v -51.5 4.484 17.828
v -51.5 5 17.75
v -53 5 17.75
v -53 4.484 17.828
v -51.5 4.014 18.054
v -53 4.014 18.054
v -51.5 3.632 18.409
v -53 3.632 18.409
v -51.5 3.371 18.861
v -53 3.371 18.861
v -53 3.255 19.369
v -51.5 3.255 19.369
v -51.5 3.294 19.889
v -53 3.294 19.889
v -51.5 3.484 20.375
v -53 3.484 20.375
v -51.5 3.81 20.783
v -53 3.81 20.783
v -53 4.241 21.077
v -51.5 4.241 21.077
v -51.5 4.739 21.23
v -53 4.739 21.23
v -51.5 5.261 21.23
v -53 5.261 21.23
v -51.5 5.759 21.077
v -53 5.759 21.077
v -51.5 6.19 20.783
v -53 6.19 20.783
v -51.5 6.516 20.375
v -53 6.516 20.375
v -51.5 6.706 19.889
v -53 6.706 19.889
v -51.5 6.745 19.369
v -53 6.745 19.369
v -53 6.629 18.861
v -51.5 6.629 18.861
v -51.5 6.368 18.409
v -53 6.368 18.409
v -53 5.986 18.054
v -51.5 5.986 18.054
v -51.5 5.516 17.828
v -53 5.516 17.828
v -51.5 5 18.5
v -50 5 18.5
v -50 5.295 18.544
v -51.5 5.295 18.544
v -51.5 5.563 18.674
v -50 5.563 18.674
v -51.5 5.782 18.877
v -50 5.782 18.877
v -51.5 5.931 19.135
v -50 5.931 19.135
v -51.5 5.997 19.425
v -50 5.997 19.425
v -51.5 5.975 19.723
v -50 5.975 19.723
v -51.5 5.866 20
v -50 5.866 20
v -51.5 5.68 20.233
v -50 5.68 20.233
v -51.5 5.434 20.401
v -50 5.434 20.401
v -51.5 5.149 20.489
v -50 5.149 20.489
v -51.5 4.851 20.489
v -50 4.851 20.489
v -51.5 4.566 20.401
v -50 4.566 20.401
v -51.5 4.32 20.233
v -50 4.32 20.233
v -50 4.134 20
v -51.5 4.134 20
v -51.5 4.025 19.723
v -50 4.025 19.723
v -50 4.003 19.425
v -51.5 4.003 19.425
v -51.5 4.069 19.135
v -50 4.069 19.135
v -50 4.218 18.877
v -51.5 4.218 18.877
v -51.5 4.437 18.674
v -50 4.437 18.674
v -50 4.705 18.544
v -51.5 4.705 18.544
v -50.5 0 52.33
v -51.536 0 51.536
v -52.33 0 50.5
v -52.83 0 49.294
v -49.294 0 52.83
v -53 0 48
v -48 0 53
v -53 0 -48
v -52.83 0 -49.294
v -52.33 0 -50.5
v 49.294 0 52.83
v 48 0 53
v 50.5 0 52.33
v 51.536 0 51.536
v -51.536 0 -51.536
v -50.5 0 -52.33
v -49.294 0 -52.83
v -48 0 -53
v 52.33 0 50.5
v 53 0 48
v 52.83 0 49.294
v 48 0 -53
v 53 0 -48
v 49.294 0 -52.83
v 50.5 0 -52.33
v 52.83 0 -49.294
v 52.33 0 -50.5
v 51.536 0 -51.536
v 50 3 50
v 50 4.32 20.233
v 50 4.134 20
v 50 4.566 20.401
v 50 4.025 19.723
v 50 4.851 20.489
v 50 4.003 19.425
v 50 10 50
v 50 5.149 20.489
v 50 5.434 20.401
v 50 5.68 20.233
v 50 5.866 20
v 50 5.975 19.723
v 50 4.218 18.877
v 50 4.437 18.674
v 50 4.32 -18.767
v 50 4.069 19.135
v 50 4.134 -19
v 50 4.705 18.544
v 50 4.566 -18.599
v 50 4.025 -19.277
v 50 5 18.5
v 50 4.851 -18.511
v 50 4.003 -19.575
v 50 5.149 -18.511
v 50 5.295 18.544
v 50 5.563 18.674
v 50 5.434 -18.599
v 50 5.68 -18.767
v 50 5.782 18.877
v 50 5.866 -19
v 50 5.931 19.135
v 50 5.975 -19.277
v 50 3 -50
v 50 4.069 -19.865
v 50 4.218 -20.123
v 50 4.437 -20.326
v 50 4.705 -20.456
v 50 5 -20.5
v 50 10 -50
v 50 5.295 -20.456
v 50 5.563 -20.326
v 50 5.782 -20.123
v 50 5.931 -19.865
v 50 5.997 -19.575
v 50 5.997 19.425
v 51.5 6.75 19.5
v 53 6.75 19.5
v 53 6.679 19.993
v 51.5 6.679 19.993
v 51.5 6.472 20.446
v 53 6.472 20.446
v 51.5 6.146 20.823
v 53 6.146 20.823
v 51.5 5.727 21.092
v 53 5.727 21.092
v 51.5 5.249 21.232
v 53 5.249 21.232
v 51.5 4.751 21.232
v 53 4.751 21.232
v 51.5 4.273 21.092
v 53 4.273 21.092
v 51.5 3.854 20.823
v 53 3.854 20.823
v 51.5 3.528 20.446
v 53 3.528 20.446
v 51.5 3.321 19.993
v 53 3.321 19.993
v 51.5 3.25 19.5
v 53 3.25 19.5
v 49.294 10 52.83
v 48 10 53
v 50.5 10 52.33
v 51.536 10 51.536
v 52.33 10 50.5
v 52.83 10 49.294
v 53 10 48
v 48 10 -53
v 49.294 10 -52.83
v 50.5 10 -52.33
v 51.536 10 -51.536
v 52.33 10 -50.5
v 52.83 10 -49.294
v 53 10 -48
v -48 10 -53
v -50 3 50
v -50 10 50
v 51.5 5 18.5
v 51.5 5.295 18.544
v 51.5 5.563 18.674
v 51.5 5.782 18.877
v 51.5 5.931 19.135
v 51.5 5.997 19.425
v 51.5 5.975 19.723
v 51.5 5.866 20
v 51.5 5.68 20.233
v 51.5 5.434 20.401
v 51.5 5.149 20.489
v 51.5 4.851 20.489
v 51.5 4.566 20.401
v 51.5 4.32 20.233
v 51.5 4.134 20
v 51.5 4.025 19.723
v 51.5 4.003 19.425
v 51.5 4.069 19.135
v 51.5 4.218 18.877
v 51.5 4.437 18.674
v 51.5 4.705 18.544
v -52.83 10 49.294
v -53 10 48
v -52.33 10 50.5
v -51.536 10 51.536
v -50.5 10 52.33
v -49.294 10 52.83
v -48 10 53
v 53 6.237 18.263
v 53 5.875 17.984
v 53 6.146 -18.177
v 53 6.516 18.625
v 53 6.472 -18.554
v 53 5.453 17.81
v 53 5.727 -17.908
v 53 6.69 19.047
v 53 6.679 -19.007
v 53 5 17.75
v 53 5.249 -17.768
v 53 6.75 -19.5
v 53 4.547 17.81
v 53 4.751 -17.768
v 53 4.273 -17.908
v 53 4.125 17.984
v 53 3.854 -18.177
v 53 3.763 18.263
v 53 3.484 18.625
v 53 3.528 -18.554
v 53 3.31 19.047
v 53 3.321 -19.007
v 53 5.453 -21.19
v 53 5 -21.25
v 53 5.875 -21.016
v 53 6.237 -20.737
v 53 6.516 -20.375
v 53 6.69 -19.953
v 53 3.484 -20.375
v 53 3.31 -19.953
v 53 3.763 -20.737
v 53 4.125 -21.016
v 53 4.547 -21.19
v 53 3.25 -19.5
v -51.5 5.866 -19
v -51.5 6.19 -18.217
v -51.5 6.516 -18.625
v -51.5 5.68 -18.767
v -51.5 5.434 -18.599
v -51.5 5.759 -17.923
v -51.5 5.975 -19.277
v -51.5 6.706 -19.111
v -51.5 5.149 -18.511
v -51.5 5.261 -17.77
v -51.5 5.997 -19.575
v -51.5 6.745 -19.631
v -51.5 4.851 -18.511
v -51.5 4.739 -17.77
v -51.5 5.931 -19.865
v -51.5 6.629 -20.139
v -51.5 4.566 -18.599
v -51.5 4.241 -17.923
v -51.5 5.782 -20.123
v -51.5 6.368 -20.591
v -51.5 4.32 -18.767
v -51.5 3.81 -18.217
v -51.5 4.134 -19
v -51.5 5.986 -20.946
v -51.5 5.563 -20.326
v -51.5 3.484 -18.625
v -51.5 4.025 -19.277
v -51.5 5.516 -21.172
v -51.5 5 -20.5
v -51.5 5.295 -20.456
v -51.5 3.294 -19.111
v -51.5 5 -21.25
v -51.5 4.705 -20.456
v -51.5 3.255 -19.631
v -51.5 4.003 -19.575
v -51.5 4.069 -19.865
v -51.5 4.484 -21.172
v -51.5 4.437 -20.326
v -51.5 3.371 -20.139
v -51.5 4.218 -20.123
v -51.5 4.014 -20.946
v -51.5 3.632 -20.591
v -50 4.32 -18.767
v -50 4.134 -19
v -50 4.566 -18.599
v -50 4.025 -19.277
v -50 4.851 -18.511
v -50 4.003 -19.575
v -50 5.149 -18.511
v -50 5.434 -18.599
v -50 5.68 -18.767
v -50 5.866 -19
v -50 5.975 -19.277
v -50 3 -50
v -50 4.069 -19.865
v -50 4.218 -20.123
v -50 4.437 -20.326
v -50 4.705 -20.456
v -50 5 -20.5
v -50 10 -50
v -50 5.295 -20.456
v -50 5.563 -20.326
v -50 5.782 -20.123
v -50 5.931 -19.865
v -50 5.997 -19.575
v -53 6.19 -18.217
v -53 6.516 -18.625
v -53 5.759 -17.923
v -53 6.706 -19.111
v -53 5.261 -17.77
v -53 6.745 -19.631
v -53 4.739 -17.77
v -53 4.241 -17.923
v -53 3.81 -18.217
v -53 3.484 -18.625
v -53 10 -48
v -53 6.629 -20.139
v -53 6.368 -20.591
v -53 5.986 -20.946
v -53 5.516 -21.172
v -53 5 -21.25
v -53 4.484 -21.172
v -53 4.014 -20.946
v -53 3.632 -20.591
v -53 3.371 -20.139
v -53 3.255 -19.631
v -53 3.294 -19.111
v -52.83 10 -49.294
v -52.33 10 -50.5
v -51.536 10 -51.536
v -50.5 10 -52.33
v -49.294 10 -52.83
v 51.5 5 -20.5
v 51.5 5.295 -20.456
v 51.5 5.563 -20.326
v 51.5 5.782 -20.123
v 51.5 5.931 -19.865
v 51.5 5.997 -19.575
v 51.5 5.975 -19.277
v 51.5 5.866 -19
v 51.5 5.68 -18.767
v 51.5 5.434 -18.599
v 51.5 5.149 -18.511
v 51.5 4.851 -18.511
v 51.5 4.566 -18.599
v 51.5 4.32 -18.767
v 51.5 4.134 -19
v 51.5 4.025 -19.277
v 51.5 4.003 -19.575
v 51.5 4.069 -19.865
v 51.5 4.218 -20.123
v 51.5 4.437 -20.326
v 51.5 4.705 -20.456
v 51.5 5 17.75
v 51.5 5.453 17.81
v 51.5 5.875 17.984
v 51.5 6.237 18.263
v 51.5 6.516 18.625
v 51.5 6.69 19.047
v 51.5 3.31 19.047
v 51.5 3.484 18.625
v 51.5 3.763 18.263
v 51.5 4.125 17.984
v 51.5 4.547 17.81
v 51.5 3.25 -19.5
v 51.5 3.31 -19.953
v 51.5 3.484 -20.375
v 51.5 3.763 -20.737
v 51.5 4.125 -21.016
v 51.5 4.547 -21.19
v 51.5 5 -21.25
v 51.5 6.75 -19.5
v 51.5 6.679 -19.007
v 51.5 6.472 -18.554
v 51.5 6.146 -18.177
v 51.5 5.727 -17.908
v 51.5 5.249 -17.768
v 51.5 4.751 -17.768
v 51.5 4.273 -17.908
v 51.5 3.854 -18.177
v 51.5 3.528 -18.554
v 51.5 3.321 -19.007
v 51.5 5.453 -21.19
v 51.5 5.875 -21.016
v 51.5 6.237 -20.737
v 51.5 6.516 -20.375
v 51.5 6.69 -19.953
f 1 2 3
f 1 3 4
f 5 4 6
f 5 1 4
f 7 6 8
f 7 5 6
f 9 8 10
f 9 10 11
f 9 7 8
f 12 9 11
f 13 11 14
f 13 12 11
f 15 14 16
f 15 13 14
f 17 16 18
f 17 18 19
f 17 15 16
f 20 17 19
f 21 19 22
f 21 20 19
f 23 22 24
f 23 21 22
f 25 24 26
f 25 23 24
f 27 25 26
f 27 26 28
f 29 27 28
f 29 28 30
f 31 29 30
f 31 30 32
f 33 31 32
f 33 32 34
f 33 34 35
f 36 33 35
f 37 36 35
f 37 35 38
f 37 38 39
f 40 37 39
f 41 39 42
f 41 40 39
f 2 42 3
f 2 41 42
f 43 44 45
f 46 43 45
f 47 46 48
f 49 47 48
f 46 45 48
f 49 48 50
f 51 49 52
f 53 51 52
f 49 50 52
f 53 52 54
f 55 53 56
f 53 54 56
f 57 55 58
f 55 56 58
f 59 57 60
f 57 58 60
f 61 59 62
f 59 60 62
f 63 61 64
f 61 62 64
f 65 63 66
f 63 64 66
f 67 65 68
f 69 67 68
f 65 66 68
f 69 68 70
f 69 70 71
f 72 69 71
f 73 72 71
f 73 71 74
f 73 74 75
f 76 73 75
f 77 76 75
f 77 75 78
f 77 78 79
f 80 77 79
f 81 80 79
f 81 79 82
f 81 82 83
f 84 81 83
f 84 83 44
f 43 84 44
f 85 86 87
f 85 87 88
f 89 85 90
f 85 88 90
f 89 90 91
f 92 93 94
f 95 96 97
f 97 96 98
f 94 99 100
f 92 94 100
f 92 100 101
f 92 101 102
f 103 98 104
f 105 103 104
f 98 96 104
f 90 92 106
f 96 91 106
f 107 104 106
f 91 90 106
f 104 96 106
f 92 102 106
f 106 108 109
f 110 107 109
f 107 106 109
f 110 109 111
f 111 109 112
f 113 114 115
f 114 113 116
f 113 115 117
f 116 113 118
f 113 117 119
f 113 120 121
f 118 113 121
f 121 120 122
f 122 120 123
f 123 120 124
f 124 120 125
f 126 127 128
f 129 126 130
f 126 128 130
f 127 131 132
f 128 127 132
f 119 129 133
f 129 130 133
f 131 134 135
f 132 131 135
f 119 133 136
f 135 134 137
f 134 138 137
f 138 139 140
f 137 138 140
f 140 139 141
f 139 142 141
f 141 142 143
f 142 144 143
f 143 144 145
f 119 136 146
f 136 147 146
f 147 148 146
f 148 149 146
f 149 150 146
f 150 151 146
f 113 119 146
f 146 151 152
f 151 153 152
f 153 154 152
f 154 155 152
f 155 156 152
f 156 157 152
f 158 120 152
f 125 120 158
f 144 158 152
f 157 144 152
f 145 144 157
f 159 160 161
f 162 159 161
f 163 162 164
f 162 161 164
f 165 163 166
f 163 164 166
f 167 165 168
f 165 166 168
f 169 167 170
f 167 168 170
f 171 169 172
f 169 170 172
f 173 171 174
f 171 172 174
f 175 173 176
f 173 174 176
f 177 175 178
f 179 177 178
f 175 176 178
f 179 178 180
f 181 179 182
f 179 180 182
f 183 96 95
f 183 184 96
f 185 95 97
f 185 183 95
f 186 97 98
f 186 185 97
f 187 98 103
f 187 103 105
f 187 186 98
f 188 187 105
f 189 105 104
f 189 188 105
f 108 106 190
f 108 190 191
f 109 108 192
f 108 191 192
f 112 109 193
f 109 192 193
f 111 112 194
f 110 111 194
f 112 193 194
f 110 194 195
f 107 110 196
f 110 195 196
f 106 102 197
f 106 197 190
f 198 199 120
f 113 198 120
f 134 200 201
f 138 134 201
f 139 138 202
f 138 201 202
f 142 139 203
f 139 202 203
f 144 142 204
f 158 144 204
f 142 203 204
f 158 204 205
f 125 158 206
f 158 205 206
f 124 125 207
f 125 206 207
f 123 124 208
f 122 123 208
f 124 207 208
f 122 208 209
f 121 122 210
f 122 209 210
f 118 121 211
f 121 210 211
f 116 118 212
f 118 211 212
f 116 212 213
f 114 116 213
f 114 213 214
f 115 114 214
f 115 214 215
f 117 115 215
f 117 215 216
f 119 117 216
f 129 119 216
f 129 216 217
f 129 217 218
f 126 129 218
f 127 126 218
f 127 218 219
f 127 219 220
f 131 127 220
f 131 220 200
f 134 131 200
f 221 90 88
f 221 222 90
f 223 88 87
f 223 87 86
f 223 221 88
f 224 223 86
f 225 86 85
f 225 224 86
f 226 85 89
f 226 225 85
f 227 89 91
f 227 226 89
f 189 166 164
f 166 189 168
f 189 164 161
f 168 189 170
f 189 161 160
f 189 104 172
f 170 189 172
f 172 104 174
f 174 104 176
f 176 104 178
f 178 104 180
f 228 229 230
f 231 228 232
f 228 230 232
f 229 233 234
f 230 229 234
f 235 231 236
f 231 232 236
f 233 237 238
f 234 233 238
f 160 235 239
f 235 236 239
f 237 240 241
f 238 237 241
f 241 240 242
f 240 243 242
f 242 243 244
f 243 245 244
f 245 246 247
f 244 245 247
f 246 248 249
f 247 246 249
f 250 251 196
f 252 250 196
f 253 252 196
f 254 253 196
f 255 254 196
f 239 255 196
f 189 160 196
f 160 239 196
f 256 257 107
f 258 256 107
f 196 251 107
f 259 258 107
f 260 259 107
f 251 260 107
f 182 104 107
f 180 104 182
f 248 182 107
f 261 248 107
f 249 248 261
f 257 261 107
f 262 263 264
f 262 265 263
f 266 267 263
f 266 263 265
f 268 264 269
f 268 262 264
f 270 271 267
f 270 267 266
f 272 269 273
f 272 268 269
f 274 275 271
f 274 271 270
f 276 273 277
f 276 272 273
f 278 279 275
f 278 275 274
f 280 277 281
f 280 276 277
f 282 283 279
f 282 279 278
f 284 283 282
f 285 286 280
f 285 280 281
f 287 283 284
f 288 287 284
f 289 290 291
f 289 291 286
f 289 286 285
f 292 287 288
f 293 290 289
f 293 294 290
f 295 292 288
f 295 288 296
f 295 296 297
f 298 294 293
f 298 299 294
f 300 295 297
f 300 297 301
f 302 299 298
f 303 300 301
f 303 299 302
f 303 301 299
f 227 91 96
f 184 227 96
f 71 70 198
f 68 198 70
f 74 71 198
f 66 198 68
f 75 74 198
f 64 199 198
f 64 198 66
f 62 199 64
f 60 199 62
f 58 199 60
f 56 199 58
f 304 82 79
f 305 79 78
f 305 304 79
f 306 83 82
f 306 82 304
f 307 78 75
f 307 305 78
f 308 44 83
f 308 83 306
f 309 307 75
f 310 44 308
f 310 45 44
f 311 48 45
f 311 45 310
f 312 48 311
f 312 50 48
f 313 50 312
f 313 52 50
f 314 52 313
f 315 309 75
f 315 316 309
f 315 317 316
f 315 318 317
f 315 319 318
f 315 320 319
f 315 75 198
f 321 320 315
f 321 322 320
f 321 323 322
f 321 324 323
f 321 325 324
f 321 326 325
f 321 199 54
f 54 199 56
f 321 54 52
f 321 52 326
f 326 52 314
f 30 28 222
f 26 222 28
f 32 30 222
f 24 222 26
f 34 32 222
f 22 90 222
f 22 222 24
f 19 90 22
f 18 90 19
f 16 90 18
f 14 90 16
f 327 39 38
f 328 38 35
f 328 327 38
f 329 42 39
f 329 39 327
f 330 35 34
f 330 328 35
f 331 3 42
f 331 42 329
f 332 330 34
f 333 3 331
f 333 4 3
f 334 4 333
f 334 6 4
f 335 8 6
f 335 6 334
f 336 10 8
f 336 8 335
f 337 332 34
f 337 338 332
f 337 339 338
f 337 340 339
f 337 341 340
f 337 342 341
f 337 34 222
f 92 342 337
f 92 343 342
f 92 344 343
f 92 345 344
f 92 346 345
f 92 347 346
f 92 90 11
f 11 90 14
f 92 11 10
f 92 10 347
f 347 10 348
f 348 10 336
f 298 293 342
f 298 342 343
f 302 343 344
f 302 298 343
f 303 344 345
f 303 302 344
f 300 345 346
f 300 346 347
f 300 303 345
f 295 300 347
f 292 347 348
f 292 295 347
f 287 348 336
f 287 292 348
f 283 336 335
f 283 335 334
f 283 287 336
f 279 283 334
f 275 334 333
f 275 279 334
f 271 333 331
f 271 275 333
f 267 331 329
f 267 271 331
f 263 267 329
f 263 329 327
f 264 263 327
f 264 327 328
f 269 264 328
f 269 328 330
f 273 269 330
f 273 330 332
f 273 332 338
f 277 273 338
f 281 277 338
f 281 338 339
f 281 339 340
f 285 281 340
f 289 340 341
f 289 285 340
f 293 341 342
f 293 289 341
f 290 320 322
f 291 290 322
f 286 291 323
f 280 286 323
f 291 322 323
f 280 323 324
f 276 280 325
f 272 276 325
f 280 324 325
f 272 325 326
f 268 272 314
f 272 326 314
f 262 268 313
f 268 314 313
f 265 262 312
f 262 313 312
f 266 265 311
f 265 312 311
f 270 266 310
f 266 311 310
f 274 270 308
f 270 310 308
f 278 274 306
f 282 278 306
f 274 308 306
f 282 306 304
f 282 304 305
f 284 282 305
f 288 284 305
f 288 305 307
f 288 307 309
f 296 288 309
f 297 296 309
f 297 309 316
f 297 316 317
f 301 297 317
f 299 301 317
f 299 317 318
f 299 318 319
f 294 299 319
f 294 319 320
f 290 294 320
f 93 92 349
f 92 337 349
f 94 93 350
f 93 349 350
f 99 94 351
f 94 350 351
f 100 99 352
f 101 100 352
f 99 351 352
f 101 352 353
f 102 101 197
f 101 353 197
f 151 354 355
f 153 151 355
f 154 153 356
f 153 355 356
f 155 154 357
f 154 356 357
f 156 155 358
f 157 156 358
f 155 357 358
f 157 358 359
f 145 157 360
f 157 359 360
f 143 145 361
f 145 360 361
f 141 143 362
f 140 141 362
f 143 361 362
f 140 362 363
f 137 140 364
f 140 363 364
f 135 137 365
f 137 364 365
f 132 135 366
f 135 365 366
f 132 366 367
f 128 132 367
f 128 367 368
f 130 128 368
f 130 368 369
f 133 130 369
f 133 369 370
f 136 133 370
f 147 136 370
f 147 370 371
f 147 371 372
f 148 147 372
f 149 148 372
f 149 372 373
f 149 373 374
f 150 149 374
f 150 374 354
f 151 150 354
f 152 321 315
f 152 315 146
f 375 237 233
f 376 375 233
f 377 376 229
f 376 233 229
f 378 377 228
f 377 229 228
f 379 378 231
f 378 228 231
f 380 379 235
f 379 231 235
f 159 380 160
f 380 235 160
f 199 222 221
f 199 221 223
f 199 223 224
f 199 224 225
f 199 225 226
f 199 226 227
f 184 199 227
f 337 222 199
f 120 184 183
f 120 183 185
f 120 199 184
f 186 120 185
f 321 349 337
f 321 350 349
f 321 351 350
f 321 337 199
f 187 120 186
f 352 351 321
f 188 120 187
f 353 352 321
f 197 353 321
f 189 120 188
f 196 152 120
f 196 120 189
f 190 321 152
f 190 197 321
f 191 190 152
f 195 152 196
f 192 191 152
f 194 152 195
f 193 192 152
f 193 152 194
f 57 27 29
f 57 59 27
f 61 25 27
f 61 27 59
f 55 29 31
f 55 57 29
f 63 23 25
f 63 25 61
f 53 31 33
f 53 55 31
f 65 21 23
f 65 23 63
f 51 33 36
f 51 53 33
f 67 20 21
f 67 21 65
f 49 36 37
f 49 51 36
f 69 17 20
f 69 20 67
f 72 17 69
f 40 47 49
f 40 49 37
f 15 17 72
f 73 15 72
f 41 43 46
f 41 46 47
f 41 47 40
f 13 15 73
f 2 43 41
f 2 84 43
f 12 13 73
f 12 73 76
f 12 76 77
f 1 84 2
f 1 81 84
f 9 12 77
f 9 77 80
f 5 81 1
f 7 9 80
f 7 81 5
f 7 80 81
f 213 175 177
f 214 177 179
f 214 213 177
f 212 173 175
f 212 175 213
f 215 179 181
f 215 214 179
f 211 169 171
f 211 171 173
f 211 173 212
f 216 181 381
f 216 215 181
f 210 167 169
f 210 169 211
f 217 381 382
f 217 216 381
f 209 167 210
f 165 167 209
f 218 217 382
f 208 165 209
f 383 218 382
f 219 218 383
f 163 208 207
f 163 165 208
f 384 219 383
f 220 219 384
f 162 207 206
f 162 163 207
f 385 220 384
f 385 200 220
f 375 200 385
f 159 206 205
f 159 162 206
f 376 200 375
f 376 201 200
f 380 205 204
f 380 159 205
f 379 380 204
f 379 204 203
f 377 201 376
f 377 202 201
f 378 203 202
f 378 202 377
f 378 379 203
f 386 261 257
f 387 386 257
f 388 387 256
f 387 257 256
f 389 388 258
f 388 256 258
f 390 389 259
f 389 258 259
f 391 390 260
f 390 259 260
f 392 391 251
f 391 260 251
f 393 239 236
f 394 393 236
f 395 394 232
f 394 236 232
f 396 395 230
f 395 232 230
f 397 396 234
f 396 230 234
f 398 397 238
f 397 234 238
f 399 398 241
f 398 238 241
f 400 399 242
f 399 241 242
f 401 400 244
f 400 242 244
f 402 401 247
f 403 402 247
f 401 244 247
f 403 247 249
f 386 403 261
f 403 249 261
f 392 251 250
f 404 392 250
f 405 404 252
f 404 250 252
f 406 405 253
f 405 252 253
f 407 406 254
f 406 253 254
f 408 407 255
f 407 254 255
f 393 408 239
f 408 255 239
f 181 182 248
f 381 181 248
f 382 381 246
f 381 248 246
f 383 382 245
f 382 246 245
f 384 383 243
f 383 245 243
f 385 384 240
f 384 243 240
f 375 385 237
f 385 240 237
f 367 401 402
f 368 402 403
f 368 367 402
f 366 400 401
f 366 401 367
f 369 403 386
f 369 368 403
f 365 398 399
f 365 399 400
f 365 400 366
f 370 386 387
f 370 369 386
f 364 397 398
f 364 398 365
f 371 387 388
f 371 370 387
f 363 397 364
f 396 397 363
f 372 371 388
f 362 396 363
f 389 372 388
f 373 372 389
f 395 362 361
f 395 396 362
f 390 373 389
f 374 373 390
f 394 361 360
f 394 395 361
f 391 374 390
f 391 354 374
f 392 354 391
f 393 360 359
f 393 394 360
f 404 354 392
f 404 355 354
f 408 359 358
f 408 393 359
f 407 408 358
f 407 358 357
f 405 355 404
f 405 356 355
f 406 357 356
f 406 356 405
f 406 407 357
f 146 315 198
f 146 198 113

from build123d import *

# Parameters (mm, degrees)
SKETCH1_W           = 106
SKETCH1_H           = 106
BOSS_EXTRUDE1_DEPTH = 10
SKETCH3_W           = 100
SKETCH3_H           = 100
CUT_EXTRUDE5_DEPTH  = 7
CUT_EXTRUDE9_DEPTH  = 1.5
SKETCH14_R          = 1
CUT_EXTRUDE10_DEPTH = 115.5
CUT_EXTRUDE11_START = -1.5
SKETCH15_R          = 1.75
CUT_EXTRUDE11_DEPTH = 1.5
FILLET1_R           = 5


with BuildPart() as part:
    # Sketch1 → Boss-Extrude1 (new body)
    with BuildSketch(Plane(origin=(0, 0, 0), x_dir=(1, 0, 0), z_dir=(0, 1, 0))):
        Rectangle(SKETCH1_W, SKETCH1_H)
    extrude(amount=BOSS_EXTRUDE1_DEPTH)

    # Sketch3 → Cut-Extrude5 (cut)
    with BuildSketch(Plane(origin=(0, 10, 0), x_dir=(1, 0, 0), z_dir=(0, 1, 0))):
        Rectangle(SKETCH3_W, SKETCH3_H)
    extrude(amount=-CUT_EXTRUDE5_DEPTH, mode=Mode.SUBTRACT)

    # Sketch12 → Cut-Extrude9 (cut)
    with BuildSketch(Plane(origin=(53, 0, 0), x_dir=(0, 0, -1), z_dir=(1, 0, 0))):
        with BuildLine():
            ThreePointArc((-17.75, 5), (-18.262563133, 6.237436867), (-19.5, 6.75))
            Line((-19.5, 6.75), (-19.5, 3.25))
            ThreePointArc((-19.5, 3.25), (-18.262563133, 3.762563133), (-17.75, 5))
        make_face()
        with BuildLine():
            Line((-19.5, 3.25), (-19.5, 6.75))
            ThreePointArc((-19.5, 6.75), (-21.25, 5), (-19.5, 3.25))
        make_face()
        with BuildLine():
            ThreePointArc((21.25, 5), (20.737436867, 6.237436867), (19.5, 6.75))
            Line((19.5, 6.75), (19.5, 3.25))
            ThreePointArc((19.5, 3.25), (20.737436867, 3.762563133), (21.25, 5))
        make_face()
        with BuildLine():
            Line((19.5, 3.25), (19.5, 6.75))
            ThreePointArc((19.5, 6.75), (17.75, 5), (19.5, 3.25))
        make_face()
    extrude(amount=-CUT_EXTRUDE9_DEPTH, mode=Mode.SUBTRACT)

    # Sketch14 → Cut-Extrude10 (cut)
    with BuildSketch(Plane(origin=(51.5, 0, 0), x_dir=(0, 0, -1), z_dir=(1, 0, 0))):
        with Locations((-19.5, 5)):
            Circle(SKETCH14_R)
        with Locations((19.5, 5)):
            Circle(SKETCH14_R)
    extrude(amount=-CUT_EXTRUDE10_DEPTH, mode=Mode.SUBTRACT)

    # Sketch15 → Cut-Extrude11 (cut)
    with BuildSketch(Plane.ZY.offset(53).offset(CUT_EXTRUDE11_START)):
        with Locations(Location((-19.5, 5, 0), (0, 0, 180))):
            Circle(SKETCH15_R)
        with Locations(Location((19.5, 5, 0), (0, 0, 180))):
            Circle(SKETCH15_R)
    extrude(amount=CUT_EXTRUDE11_DEPTH, mode=Mode.SUBTRACT)

    # Fillet1
    fillet1_edges = [part.edges().sort_by_distance(p)[0] for p in [
        (53, 5, 53),
        (-53, 5, 53),
        (-53, 5, -53),
        (53, 5, -53),
    ]]
    fillet(fillet1_edges, radius=FILLET1_R)


solid = part.part
